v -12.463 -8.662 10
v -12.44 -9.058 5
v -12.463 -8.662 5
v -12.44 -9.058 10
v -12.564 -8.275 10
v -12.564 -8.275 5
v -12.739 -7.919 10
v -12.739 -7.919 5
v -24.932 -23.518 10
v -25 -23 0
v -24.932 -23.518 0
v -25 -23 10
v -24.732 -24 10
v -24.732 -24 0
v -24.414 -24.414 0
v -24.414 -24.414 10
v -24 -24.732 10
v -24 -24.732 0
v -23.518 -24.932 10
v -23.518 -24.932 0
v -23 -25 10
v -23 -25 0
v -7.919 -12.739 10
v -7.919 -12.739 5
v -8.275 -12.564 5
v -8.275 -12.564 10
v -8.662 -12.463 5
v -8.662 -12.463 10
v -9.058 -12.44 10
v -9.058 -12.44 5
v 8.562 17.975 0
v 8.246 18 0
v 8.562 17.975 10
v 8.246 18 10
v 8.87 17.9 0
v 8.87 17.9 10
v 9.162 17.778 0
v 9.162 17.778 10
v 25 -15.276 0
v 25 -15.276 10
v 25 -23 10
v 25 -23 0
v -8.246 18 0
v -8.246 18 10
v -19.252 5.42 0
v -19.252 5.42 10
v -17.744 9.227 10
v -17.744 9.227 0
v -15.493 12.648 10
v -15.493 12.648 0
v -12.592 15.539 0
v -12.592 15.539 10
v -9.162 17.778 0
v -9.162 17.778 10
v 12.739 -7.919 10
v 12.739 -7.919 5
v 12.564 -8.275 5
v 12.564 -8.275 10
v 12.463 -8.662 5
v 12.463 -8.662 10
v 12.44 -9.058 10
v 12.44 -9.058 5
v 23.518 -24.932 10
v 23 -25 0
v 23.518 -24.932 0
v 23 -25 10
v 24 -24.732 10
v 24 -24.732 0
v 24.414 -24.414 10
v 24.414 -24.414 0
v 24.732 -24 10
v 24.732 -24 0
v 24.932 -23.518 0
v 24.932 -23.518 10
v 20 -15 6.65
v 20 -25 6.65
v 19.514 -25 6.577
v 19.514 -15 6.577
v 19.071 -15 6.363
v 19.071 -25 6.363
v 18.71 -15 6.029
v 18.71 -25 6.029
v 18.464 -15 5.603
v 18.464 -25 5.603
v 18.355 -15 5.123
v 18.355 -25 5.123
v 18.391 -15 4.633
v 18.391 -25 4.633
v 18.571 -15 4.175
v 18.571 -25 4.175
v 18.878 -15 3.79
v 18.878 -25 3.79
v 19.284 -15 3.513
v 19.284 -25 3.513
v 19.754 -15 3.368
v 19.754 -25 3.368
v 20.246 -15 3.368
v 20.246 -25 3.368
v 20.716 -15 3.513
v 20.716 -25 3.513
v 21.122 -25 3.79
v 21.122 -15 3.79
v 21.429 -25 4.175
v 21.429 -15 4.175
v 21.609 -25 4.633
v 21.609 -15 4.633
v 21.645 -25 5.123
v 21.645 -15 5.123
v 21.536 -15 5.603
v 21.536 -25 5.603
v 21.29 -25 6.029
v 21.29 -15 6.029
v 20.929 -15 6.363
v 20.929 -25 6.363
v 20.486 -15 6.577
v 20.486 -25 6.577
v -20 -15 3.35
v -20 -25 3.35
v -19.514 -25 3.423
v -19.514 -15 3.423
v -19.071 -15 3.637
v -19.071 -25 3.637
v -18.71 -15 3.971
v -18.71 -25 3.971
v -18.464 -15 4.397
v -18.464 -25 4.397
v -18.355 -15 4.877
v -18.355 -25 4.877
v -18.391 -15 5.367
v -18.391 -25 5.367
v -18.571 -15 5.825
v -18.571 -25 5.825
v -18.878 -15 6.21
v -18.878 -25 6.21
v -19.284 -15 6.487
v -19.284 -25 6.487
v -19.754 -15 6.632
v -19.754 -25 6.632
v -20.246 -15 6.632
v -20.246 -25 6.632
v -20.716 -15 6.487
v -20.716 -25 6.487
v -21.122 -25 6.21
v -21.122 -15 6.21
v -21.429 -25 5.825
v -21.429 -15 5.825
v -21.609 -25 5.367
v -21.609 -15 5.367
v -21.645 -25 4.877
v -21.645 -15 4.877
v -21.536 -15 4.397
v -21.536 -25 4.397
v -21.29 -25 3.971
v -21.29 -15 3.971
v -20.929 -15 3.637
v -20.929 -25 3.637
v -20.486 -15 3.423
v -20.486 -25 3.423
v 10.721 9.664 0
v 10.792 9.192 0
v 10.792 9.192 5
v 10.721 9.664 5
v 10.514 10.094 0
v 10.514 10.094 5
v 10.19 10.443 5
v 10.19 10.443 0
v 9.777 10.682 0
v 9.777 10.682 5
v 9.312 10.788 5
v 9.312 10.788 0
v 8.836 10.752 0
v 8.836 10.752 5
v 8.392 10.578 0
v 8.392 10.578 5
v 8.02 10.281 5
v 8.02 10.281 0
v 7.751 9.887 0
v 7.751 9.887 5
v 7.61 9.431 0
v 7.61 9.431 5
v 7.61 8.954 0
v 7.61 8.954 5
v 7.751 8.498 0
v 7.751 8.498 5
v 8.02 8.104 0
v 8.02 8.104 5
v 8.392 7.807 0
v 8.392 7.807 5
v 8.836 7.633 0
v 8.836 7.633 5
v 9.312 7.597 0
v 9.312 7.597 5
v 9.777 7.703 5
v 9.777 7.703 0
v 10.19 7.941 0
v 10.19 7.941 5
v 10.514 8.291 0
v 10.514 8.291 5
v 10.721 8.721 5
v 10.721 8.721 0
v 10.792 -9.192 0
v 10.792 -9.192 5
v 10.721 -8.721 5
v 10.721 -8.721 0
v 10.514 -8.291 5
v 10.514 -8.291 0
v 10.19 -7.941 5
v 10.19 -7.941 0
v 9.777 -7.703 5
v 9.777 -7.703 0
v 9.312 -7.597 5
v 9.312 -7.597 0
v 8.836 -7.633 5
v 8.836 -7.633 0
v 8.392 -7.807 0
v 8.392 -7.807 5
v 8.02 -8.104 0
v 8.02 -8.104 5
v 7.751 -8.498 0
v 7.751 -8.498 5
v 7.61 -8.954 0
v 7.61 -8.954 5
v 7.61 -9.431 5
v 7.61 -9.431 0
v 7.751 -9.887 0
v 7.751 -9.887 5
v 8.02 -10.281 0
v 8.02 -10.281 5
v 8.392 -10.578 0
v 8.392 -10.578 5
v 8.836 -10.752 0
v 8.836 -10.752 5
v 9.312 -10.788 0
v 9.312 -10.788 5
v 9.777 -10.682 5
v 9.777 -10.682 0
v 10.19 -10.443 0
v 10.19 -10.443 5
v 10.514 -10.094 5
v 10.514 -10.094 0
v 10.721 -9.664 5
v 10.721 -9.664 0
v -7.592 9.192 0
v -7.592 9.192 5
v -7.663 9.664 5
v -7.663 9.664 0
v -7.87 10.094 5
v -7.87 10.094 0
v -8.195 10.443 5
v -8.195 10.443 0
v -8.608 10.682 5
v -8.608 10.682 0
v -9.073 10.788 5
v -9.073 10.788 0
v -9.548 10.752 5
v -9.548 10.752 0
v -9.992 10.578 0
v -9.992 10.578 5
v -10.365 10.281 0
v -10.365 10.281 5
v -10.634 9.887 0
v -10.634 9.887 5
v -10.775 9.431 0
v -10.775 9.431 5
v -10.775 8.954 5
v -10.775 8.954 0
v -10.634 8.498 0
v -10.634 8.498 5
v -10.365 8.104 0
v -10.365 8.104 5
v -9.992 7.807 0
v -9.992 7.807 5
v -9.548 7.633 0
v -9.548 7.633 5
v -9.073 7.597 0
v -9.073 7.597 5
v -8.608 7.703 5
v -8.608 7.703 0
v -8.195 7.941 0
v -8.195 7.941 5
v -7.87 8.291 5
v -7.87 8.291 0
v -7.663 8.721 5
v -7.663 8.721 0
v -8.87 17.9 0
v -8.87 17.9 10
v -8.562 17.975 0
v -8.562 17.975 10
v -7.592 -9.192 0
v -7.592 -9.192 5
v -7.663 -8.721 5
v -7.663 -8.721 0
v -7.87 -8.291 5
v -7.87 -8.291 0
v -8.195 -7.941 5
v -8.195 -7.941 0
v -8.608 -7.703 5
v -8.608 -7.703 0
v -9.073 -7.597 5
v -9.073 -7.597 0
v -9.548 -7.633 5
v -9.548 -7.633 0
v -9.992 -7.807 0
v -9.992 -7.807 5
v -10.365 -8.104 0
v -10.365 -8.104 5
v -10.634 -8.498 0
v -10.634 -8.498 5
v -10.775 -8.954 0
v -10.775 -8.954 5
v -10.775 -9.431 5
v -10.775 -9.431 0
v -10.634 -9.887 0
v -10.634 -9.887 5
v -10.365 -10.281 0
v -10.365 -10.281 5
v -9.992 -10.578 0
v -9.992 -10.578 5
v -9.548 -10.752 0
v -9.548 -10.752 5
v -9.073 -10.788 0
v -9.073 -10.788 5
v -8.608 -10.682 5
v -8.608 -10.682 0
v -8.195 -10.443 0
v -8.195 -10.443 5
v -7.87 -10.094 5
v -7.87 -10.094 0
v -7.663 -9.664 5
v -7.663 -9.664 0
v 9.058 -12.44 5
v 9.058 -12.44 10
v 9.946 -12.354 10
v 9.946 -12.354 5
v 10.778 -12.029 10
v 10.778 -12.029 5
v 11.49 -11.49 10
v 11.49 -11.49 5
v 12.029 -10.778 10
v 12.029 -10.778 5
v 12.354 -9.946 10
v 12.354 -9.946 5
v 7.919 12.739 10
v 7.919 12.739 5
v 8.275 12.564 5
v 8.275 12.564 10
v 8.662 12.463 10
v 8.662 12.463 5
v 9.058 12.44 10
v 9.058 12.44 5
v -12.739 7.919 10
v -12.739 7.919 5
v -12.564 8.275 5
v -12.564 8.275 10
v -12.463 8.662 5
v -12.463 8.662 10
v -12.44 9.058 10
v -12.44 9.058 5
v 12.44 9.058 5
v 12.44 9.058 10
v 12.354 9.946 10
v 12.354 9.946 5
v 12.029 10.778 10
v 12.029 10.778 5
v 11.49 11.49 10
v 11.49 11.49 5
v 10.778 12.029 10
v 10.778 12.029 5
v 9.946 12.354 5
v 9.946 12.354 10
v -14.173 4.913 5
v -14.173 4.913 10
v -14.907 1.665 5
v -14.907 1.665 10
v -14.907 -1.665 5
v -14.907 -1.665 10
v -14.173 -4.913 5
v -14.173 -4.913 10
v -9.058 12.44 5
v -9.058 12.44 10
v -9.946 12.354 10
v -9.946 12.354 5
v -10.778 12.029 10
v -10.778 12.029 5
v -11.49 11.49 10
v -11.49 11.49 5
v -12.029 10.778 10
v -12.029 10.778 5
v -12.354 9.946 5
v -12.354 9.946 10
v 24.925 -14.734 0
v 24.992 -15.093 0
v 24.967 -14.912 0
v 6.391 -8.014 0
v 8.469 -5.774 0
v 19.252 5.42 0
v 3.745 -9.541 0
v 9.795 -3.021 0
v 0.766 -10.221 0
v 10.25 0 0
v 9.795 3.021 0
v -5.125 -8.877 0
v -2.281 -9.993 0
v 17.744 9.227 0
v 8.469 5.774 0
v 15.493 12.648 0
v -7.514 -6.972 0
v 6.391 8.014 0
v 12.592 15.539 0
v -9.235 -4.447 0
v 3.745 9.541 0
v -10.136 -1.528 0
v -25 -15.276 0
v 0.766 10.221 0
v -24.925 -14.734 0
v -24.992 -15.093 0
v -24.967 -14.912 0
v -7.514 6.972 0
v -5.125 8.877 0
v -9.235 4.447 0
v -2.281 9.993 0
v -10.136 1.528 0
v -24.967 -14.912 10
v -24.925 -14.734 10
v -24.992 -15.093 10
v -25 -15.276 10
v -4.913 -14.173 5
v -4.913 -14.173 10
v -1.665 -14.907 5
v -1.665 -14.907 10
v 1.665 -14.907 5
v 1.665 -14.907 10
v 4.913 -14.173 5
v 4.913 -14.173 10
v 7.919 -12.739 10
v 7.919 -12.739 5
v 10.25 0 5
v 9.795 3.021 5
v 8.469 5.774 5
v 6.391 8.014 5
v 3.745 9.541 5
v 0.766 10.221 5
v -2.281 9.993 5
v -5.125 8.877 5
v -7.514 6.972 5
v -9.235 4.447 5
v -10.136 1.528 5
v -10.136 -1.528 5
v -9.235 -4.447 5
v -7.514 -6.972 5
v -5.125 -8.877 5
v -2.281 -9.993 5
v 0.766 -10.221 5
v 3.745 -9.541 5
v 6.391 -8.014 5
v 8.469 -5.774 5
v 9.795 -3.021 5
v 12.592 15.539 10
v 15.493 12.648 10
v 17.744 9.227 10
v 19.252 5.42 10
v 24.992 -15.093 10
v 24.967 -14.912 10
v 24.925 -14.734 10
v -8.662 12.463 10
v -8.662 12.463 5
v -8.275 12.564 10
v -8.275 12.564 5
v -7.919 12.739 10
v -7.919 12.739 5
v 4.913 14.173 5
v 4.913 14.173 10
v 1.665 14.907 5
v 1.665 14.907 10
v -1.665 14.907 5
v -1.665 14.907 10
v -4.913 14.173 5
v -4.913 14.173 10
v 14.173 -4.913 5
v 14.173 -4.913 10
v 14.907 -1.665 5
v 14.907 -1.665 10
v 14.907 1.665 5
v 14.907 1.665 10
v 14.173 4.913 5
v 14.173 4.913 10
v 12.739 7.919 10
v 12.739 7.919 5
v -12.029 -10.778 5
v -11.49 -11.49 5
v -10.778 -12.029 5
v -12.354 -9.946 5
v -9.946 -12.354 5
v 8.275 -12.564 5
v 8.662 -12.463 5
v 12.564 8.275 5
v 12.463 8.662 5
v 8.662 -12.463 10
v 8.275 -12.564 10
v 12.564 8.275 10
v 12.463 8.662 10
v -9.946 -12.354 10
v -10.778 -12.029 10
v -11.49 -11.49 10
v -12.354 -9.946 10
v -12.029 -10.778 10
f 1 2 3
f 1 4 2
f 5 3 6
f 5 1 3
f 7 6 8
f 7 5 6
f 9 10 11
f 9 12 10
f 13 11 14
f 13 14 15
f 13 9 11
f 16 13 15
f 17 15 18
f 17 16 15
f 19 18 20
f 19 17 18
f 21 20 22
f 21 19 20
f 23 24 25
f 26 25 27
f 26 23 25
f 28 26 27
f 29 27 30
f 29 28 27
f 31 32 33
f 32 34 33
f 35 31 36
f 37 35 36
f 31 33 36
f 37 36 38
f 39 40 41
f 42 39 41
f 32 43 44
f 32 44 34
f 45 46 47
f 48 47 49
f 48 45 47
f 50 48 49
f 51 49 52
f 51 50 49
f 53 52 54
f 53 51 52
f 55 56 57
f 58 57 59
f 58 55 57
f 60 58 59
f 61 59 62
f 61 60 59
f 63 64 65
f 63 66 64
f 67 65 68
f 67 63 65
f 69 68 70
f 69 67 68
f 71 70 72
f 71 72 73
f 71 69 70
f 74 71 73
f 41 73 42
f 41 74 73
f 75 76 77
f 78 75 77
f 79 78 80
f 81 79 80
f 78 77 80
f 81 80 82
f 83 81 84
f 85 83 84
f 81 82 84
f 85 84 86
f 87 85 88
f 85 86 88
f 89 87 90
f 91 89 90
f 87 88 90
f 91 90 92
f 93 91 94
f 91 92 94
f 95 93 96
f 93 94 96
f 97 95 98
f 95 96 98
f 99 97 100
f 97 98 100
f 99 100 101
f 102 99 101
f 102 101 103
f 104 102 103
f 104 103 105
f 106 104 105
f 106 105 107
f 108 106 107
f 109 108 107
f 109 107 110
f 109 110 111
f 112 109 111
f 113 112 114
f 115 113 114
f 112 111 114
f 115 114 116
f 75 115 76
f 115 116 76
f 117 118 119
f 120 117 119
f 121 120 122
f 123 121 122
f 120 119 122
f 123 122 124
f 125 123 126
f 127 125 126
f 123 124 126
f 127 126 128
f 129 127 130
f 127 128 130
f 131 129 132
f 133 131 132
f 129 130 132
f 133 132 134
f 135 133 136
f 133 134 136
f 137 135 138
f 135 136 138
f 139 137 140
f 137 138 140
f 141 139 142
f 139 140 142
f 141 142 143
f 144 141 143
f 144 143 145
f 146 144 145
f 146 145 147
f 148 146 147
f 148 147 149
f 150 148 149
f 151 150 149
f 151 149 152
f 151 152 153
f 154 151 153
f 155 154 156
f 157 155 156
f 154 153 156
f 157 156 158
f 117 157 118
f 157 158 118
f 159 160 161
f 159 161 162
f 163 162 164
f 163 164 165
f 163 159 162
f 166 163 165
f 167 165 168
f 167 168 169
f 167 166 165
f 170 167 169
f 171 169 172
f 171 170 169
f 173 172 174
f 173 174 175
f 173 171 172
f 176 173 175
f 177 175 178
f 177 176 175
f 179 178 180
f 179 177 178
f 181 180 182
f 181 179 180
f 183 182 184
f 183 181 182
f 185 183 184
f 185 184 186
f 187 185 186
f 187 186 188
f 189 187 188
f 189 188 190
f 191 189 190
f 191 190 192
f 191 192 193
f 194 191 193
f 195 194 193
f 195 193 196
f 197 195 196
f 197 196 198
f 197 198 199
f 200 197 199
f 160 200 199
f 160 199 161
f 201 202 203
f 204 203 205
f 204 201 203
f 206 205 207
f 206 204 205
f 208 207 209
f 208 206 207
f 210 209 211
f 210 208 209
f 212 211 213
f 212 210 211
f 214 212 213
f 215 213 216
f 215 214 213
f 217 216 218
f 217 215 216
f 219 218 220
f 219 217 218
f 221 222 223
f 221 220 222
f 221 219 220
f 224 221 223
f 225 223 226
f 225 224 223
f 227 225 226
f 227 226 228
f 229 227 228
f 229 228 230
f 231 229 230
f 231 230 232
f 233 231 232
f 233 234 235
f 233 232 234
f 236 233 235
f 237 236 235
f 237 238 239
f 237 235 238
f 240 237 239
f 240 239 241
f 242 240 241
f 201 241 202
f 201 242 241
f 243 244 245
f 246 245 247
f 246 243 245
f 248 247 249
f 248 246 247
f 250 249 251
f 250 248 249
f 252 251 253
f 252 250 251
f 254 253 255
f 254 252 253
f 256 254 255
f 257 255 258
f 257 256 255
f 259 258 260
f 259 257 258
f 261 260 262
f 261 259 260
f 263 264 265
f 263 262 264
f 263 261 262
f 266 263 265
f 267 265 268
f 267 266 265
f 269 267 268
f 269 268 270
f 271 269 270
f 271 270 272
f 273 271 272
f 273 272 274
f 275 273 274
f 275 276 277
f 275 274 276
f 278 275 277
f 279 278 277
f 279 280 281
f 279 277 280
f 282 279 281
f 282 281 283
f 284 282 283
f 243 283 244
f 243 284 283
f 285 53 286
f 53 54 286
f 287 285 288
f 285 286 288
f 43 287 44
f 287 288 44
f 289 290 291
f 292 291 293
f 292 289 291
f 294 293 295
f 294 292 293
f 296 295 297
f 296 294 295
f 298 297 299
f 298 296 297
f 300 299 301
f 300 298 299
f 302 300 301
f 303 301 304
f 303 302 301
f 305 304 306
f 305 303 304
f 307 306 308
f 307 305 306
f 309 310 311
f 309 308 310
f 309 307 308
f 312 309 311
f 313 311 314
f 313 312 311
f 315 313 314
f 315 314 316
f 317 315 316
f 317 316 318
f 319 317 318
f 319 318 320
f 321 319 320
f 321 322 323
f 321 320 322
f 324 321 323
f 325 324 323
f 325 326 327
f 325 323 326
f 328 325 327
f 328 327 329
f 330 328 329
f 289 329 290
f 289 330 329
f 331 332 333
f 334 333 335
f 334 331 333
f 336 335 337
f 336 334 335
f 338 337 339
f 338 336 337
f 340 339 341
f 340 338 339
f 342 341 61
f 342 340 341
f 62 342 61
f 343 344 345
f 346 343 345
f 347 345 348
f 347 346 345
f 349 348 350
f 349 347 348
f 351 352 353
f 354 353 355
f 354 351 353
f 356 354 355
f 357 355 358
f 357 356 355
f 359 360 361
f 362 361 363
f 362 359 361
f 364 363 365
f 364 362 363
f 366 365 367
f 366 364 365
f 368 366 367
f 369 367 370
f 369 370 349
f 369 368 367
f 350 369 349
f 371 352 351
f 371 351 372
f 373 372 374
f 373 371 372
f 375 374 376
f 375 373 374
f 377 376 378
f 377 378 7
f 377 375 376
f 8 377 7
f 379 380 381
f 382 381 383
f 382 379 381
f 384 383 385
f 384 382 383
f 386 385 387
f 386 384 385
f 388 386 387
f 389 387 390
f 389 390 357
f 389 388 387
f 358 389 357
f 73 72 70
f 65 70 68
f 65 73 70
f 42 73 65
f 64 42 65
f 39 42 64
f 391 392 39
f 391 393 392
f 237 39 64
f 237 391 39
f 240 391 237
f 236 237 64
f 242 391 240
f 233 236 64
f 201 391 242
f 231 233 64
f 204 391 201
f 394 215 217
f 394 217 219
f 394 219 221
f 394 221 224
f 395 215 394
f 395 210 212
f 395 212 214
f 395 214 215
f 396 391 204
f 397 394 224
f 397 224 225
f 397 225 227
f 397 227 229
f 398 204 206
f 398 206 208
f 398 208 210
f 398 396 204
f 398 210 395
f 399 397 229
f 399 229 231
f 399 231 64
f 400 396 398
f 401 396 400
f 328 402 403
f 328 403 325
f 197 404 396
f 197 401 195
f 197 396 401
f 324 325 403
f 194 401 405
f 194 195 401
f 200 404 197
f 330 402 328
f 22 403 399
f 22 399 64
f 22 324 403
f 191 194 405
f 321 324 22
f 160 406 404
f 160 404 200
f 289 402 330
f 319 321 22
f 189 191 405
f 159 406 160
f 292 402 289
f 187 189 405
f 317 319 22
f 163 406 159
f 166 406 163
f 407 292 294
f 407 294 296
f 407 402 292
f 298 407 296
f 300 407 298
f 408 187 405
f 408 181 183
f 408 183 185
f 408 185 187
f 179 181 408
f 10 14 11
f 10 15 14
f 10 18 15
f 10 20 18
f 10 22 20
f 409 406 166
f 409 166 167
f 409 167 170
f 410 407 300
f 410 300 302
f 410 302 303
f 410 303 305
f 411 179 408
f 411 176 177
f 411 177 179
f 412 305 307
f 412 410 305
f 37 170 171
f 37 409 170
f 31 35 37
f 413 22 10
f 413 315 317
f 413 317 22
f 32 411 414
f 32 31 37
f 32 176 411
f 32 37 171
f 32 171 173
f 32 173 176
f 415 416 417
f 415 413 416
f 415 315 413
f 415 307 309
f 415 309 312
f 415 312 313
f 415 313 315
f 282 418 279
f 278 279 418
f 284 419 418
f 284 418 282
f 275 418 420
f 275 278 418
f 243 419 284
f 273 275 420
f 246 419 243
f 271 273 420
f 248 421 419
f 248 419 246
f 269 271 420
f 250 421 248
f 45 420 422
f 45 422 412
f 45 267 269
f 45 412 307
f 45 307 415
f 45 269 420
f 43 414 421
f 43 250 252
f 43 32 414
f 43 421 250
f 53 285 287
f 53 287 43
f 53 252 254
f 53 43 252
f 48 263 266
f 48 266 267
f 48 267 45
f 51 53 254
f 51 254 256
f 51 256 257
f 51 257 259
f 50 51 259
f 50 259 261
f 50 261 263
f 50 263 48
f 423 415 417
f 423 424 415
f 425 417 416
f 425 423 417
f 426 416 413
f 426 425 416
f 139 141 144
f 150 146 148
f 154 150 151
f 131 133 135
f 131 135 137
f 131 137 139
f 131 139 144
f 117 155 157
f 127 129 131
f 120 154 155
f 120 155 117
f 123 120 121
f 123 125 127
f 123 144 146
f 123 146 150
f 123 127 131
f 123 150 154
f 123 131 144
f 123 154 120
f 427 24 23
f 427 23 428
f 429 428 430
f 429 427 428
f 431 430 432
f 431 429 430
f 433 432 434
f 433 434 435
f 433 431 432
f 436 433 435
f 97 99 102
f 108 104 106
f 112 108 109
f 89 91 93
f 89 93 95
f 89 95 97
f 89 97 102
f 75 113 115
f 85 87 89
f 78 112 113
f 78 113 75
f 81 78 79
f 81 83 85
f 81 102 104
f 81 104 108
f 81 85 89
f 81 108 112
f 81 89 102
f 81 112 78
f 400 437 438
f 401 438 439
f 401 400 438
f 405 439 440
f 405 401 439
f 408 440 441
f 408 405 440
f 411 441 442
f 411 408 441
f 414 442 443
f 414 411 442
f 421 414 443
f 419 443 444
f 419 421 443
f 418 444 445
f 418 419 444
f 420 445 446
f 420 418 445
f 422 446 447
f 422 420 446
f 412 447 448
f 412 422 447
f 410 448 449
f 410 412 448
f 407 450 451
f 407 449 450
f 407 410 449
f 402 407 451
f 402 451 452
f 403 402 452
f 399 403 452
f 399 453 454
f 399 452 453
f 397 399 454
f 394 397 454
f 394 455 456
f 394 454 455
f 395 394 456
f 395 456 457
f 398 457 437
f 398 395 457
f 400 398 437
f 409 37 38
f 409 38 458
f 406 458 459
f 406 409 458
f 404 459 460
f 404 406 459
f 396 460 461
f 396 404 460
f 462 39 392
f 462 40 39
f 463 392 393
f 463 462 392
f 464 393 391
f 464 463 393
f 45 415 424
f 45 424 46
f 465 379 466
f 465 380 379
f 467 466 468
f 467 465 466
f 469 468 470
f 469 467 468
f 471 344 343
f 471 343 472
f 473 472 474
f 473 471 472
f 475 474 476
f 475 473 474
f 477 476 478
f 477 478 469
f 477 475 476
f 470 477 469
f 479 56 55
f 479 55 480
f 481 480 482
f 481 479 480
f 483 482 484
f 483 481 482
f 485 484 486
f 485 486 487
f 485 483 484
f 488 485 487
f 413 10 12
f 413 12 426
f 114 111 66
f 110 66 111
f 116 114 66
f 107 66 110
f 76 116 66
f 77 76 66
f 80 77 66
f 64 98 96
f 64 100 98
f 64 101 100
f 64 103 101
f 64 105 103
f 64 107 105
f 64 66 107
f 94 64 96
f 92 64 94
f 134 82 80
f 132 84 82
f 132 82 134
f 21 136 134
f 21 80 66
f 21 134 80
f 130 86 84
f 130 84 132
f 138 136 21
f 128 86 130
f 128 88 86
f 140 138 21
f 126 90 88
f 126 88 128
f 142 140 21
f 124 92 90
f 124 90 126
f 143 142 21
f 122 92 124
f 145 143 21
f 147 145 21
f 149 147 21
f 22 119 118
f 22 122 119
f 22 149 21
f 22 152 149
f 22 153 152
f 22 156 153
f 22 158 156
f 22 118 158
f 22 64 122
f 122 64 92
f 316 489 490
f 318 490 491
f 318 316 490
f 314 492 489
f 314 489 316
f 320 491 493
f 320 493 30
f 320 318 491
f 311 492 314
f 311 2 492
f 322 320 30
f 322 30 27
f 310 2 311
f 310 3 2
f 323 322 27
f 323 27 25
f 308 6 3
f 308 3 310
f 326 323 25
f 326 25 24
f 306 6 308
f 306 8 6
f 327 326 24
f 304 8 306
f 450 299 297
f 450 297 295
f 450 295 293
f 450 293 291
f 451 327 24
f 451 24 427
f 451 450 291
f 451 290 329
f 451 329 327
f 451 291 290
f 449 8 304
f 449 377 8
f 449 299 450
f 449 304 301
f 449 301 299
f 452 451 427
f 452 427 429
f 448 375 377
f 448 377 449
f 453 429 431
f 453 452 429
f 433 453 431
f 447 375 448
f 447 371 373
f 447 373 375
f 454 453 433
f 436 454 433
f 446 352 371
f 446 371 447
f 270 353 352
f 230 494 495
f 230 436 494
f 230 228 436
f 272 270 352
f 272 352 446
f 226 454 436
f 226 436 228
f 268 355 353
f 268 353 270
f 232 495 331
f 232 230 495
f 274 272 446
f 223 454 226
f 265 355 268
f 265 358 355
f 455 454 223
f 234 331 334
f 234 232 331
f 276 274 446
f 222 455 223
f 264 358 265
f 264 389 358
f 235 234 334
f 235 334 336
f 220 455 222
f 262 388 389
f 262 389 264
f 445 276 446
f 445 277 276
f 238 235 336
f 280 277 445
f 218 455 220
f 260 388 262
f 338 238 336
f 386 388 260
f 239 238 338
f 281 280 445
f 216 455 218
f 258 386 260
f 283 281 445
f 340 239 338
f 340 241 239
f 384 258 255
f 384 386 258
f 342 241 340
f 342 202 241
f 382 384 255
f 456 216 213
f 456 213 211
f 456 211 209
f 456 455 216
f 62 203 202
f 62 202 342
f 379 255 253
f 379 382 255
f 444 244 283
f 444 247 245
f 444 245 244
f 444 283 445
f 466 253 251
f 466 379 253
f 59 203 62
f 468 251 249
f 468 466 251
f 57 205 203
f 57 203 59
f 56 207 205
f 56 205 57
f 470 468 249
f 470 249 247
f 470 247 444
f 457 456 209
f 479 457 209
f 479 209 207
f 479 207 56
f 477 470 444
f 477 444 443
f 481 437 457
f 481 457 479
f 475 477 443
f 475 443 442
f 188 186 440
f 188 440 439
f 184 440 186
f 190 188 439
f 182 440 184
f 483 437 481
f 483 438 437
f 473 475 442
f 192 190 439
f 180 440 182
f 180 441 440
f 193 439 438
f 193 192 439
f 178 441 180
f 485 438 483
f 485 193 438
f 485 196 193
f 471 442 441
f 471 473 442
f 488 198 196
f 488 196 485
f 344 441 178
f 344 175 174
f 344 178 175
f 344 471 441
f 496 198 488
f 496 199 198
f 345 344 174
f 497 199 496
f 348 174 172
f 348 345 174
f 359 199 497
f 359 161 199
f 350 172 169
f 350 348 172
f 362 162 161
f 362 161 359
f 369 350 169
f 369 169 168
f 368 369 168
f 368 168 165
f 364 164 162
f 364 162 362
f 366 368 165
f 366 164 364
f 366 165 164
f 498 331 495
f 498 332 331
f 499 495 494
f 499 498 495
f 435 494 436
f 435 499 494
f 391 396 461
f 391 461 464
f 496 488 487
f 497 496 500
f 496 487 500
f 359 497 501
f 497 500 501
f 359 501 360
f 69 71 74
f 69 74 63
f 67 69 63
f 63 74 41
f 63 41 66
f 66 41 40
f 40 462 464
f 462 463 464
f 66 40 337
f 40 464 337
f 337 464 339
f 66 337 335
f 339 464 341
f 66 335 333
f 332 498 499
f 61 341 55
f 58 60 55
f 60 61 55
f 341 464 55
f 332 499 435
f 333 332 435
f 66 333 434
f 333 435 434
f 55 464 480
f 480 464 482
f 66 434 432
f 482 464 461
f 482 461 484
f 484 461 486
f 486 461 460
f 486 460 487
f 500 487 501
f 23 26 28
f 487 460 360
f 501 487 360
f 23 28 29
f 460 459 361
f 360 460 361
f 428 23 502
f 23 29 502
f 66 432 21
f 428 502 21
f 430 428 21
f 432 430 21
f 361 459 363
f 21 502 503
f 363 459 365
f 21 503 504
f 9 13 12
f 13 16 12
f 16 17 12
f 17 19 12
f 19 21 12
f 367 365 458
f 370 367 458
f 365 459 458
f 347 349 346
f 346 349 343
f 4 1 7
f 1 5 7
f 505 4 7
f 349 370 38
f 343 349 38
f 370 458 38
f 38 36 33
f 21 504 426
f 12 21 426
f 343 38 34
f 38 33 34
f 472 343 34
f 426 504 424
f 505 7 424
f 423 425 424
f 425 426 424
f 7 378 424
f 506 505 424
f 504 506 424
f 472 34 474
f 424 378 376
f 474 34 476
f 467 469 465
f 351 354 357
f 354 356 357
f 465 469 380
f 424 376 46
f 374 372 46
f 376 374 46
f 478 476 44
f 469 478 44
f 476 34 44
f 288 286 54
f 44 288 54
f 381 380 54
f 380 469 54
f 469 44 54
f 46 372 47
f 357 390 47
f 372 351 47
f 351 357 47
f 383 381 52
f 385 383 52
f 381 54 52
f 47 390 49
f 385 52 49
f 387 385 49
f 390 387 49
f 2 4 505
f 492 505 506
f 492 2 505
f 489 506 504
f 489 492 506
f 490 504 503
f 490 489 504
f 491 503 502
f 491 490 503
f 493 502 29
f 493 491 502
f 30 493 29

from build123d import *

# Parameters (mm, degrees)
SKETCH_1_R          = 10.25
SKETCH_1_R_2        = 1.6
EXTRUDE_1_DEPTH     = 10
SKETCH_3_R          = 1.65
CUT_EXTRUDE_2_DEPTH = 10
FILLET_1_R          = 2
CUT_EXTRUDE_START   = -5
SKETCH_4_R          = 1.6
CUT_EXTRUDE_3_DEPTH = 5
FILLET_2_R          = 2


with BuildPart() as part:
    # ｽｹｯﾁ1 → ﾎﾞｽ - 押し出し1 (new body)
    with BuildSketch(Plane.XY):
        with BuildLine():
            Line((-25, -15), (-19.25171886, 5.419531433))
            ThreePointArc((-19.25171886, 5.419531433), (-15.334292097, 12.83976191), (-8.717797887, 18))
            Line((-8.717797887, 18), (8.717797887, 18))
            ThreePointArc((8.717797887, 18), (15.334292097, 12.83976191), (19.25171886, 5.419531433))
            Line((19.25171886, 5.419531433), (25, -15))
            Line((25, -15), (25, -25))
            Line((25, -25), (-25, -25))
            Line((-25, -25), (-25, -15))
        make_face()
        Circle(SKETCH_1_R, mode=Mode.SUBTRACT)
        with Locations((9.192388155, 9.192388155)):
            Circle(SKETCH_1_R_2, mode=Mode.SUBTRACT)
        with Locations((9.192388155, -9.192388155)):
            Circle(SKETCH_1_R_2, mode=Mode.SUBTRACT)
        with Locations((-9.192388155, -9.192388155)):
            Circle(SKETCH_1_R_2, mode=Mode.SUBTRACT)
        with Locations((-9.192388155, 9.192388155)):
            Circle(SKETCH_1_R_2, mode=Mode.SUBTRACT)
    extrude(amount=EXTRUDE_1_DEPTH)

    # ｽｹｯﾁ3 → ｶｯﾄ - 押し出し2 (cut)
    with BuildSketch(Plane.XZ.offset(25)):
        with Locations(Location((-20, 5, 0), (0, 0, 270))):
            Circle(SKETCH_3_R)
        with Locations(Location((20, 5, 0), (0, 0, 90))):
            Circle(SKETCH_3_R)
    extrude(amount=-CUT_EXTRUDE_2_DEPTH, mode=Mode.SUBTRACT)

    # ﾌｨﾚｯﾄ1
    fillet_1_edges = [part.edges().sort_by_distance(p)[0] for p in [
        (25, -25, 5),
        (-25, -25, 5),
        (-25, -15, 5),
        (-8.717797887, 18, 5),
        (8.717797887, 18, 5),
        (25, -15, 5),
    ]]
    fillet(fillet_1_edges, radius=FILLET_1_R)

    # ｽｹｯﾁ4 → ｶｯﾄ - 押し出し3 (cut)
    with BuildSketch(Plane.XY.offset(10).offset(CUT_EXTRUDE_START)):
        with BuildLine():
            ThreePointArc((12.365702043, 8.49054845), (11.490485194, 11.490485194), (8.49054845, 12.365702043))
            ThreePointArc((8.49054845, 12.365702043), (0, 15), (-8.49054845, 12.365702043))
            ThreePointArc((-8.49054845, 12.365702043), (-11.490485194, 11.490485194), (-12.365702043, 8.49054845))
            ThreePointArc((-12.365702043, 8.49054845), (-15, 0), (-12.365702043, -8.49054845))
            ThreePointArc((-12.365702043, -8.49054845), (-11.490485194, -11.490485194), (-8.49054845, -12.365702043))
            ThreePointArc((-8.49054845, -12.365702043), (0, -15), (8.49054845, -12.365702043))
            ThreePointArc((8.49054845, -12.365702043), (11.490485194, -11.490485194), (12.365702043, -8.49054845))
            ThreePointArc((12.365702043, -8.49054845), (15, 0), (12.365702043, 8.49054845))
        make_face()
        with Locations((9.192388155, 9.192388155)):
            Circle(SKETCH_4_R, mode=Mode.SUBTRACT)
    extrude(amount=CUT_EXTRUDE_3_DEPTH, mode=Mode.SUBTRACT)

    # ﾌｨﾚｯﾄ2
    fillet_2_edges = [part.edges().sort_by_distance(p)[0] for p in [
        (-8.49054845, 12.365702043, 7.5),
        (8.49054845, 12.365702043, 7.5),
        (12.365702043, 8.49054845, 7.5),
        (12.365702043, -8.49054845, 7.5),
        (8.49054845, -12.365702043, 7.5),
        (-8.49054845, -12.365702043, 7.5),
        (-12.365702043, -8.49054845, 7.5),
        (-12.365702043, 8.49054845, 7.5),
    ]]
    fillet(fillet_2_edges, radius=FILLET_2_R)


solid = part.part
